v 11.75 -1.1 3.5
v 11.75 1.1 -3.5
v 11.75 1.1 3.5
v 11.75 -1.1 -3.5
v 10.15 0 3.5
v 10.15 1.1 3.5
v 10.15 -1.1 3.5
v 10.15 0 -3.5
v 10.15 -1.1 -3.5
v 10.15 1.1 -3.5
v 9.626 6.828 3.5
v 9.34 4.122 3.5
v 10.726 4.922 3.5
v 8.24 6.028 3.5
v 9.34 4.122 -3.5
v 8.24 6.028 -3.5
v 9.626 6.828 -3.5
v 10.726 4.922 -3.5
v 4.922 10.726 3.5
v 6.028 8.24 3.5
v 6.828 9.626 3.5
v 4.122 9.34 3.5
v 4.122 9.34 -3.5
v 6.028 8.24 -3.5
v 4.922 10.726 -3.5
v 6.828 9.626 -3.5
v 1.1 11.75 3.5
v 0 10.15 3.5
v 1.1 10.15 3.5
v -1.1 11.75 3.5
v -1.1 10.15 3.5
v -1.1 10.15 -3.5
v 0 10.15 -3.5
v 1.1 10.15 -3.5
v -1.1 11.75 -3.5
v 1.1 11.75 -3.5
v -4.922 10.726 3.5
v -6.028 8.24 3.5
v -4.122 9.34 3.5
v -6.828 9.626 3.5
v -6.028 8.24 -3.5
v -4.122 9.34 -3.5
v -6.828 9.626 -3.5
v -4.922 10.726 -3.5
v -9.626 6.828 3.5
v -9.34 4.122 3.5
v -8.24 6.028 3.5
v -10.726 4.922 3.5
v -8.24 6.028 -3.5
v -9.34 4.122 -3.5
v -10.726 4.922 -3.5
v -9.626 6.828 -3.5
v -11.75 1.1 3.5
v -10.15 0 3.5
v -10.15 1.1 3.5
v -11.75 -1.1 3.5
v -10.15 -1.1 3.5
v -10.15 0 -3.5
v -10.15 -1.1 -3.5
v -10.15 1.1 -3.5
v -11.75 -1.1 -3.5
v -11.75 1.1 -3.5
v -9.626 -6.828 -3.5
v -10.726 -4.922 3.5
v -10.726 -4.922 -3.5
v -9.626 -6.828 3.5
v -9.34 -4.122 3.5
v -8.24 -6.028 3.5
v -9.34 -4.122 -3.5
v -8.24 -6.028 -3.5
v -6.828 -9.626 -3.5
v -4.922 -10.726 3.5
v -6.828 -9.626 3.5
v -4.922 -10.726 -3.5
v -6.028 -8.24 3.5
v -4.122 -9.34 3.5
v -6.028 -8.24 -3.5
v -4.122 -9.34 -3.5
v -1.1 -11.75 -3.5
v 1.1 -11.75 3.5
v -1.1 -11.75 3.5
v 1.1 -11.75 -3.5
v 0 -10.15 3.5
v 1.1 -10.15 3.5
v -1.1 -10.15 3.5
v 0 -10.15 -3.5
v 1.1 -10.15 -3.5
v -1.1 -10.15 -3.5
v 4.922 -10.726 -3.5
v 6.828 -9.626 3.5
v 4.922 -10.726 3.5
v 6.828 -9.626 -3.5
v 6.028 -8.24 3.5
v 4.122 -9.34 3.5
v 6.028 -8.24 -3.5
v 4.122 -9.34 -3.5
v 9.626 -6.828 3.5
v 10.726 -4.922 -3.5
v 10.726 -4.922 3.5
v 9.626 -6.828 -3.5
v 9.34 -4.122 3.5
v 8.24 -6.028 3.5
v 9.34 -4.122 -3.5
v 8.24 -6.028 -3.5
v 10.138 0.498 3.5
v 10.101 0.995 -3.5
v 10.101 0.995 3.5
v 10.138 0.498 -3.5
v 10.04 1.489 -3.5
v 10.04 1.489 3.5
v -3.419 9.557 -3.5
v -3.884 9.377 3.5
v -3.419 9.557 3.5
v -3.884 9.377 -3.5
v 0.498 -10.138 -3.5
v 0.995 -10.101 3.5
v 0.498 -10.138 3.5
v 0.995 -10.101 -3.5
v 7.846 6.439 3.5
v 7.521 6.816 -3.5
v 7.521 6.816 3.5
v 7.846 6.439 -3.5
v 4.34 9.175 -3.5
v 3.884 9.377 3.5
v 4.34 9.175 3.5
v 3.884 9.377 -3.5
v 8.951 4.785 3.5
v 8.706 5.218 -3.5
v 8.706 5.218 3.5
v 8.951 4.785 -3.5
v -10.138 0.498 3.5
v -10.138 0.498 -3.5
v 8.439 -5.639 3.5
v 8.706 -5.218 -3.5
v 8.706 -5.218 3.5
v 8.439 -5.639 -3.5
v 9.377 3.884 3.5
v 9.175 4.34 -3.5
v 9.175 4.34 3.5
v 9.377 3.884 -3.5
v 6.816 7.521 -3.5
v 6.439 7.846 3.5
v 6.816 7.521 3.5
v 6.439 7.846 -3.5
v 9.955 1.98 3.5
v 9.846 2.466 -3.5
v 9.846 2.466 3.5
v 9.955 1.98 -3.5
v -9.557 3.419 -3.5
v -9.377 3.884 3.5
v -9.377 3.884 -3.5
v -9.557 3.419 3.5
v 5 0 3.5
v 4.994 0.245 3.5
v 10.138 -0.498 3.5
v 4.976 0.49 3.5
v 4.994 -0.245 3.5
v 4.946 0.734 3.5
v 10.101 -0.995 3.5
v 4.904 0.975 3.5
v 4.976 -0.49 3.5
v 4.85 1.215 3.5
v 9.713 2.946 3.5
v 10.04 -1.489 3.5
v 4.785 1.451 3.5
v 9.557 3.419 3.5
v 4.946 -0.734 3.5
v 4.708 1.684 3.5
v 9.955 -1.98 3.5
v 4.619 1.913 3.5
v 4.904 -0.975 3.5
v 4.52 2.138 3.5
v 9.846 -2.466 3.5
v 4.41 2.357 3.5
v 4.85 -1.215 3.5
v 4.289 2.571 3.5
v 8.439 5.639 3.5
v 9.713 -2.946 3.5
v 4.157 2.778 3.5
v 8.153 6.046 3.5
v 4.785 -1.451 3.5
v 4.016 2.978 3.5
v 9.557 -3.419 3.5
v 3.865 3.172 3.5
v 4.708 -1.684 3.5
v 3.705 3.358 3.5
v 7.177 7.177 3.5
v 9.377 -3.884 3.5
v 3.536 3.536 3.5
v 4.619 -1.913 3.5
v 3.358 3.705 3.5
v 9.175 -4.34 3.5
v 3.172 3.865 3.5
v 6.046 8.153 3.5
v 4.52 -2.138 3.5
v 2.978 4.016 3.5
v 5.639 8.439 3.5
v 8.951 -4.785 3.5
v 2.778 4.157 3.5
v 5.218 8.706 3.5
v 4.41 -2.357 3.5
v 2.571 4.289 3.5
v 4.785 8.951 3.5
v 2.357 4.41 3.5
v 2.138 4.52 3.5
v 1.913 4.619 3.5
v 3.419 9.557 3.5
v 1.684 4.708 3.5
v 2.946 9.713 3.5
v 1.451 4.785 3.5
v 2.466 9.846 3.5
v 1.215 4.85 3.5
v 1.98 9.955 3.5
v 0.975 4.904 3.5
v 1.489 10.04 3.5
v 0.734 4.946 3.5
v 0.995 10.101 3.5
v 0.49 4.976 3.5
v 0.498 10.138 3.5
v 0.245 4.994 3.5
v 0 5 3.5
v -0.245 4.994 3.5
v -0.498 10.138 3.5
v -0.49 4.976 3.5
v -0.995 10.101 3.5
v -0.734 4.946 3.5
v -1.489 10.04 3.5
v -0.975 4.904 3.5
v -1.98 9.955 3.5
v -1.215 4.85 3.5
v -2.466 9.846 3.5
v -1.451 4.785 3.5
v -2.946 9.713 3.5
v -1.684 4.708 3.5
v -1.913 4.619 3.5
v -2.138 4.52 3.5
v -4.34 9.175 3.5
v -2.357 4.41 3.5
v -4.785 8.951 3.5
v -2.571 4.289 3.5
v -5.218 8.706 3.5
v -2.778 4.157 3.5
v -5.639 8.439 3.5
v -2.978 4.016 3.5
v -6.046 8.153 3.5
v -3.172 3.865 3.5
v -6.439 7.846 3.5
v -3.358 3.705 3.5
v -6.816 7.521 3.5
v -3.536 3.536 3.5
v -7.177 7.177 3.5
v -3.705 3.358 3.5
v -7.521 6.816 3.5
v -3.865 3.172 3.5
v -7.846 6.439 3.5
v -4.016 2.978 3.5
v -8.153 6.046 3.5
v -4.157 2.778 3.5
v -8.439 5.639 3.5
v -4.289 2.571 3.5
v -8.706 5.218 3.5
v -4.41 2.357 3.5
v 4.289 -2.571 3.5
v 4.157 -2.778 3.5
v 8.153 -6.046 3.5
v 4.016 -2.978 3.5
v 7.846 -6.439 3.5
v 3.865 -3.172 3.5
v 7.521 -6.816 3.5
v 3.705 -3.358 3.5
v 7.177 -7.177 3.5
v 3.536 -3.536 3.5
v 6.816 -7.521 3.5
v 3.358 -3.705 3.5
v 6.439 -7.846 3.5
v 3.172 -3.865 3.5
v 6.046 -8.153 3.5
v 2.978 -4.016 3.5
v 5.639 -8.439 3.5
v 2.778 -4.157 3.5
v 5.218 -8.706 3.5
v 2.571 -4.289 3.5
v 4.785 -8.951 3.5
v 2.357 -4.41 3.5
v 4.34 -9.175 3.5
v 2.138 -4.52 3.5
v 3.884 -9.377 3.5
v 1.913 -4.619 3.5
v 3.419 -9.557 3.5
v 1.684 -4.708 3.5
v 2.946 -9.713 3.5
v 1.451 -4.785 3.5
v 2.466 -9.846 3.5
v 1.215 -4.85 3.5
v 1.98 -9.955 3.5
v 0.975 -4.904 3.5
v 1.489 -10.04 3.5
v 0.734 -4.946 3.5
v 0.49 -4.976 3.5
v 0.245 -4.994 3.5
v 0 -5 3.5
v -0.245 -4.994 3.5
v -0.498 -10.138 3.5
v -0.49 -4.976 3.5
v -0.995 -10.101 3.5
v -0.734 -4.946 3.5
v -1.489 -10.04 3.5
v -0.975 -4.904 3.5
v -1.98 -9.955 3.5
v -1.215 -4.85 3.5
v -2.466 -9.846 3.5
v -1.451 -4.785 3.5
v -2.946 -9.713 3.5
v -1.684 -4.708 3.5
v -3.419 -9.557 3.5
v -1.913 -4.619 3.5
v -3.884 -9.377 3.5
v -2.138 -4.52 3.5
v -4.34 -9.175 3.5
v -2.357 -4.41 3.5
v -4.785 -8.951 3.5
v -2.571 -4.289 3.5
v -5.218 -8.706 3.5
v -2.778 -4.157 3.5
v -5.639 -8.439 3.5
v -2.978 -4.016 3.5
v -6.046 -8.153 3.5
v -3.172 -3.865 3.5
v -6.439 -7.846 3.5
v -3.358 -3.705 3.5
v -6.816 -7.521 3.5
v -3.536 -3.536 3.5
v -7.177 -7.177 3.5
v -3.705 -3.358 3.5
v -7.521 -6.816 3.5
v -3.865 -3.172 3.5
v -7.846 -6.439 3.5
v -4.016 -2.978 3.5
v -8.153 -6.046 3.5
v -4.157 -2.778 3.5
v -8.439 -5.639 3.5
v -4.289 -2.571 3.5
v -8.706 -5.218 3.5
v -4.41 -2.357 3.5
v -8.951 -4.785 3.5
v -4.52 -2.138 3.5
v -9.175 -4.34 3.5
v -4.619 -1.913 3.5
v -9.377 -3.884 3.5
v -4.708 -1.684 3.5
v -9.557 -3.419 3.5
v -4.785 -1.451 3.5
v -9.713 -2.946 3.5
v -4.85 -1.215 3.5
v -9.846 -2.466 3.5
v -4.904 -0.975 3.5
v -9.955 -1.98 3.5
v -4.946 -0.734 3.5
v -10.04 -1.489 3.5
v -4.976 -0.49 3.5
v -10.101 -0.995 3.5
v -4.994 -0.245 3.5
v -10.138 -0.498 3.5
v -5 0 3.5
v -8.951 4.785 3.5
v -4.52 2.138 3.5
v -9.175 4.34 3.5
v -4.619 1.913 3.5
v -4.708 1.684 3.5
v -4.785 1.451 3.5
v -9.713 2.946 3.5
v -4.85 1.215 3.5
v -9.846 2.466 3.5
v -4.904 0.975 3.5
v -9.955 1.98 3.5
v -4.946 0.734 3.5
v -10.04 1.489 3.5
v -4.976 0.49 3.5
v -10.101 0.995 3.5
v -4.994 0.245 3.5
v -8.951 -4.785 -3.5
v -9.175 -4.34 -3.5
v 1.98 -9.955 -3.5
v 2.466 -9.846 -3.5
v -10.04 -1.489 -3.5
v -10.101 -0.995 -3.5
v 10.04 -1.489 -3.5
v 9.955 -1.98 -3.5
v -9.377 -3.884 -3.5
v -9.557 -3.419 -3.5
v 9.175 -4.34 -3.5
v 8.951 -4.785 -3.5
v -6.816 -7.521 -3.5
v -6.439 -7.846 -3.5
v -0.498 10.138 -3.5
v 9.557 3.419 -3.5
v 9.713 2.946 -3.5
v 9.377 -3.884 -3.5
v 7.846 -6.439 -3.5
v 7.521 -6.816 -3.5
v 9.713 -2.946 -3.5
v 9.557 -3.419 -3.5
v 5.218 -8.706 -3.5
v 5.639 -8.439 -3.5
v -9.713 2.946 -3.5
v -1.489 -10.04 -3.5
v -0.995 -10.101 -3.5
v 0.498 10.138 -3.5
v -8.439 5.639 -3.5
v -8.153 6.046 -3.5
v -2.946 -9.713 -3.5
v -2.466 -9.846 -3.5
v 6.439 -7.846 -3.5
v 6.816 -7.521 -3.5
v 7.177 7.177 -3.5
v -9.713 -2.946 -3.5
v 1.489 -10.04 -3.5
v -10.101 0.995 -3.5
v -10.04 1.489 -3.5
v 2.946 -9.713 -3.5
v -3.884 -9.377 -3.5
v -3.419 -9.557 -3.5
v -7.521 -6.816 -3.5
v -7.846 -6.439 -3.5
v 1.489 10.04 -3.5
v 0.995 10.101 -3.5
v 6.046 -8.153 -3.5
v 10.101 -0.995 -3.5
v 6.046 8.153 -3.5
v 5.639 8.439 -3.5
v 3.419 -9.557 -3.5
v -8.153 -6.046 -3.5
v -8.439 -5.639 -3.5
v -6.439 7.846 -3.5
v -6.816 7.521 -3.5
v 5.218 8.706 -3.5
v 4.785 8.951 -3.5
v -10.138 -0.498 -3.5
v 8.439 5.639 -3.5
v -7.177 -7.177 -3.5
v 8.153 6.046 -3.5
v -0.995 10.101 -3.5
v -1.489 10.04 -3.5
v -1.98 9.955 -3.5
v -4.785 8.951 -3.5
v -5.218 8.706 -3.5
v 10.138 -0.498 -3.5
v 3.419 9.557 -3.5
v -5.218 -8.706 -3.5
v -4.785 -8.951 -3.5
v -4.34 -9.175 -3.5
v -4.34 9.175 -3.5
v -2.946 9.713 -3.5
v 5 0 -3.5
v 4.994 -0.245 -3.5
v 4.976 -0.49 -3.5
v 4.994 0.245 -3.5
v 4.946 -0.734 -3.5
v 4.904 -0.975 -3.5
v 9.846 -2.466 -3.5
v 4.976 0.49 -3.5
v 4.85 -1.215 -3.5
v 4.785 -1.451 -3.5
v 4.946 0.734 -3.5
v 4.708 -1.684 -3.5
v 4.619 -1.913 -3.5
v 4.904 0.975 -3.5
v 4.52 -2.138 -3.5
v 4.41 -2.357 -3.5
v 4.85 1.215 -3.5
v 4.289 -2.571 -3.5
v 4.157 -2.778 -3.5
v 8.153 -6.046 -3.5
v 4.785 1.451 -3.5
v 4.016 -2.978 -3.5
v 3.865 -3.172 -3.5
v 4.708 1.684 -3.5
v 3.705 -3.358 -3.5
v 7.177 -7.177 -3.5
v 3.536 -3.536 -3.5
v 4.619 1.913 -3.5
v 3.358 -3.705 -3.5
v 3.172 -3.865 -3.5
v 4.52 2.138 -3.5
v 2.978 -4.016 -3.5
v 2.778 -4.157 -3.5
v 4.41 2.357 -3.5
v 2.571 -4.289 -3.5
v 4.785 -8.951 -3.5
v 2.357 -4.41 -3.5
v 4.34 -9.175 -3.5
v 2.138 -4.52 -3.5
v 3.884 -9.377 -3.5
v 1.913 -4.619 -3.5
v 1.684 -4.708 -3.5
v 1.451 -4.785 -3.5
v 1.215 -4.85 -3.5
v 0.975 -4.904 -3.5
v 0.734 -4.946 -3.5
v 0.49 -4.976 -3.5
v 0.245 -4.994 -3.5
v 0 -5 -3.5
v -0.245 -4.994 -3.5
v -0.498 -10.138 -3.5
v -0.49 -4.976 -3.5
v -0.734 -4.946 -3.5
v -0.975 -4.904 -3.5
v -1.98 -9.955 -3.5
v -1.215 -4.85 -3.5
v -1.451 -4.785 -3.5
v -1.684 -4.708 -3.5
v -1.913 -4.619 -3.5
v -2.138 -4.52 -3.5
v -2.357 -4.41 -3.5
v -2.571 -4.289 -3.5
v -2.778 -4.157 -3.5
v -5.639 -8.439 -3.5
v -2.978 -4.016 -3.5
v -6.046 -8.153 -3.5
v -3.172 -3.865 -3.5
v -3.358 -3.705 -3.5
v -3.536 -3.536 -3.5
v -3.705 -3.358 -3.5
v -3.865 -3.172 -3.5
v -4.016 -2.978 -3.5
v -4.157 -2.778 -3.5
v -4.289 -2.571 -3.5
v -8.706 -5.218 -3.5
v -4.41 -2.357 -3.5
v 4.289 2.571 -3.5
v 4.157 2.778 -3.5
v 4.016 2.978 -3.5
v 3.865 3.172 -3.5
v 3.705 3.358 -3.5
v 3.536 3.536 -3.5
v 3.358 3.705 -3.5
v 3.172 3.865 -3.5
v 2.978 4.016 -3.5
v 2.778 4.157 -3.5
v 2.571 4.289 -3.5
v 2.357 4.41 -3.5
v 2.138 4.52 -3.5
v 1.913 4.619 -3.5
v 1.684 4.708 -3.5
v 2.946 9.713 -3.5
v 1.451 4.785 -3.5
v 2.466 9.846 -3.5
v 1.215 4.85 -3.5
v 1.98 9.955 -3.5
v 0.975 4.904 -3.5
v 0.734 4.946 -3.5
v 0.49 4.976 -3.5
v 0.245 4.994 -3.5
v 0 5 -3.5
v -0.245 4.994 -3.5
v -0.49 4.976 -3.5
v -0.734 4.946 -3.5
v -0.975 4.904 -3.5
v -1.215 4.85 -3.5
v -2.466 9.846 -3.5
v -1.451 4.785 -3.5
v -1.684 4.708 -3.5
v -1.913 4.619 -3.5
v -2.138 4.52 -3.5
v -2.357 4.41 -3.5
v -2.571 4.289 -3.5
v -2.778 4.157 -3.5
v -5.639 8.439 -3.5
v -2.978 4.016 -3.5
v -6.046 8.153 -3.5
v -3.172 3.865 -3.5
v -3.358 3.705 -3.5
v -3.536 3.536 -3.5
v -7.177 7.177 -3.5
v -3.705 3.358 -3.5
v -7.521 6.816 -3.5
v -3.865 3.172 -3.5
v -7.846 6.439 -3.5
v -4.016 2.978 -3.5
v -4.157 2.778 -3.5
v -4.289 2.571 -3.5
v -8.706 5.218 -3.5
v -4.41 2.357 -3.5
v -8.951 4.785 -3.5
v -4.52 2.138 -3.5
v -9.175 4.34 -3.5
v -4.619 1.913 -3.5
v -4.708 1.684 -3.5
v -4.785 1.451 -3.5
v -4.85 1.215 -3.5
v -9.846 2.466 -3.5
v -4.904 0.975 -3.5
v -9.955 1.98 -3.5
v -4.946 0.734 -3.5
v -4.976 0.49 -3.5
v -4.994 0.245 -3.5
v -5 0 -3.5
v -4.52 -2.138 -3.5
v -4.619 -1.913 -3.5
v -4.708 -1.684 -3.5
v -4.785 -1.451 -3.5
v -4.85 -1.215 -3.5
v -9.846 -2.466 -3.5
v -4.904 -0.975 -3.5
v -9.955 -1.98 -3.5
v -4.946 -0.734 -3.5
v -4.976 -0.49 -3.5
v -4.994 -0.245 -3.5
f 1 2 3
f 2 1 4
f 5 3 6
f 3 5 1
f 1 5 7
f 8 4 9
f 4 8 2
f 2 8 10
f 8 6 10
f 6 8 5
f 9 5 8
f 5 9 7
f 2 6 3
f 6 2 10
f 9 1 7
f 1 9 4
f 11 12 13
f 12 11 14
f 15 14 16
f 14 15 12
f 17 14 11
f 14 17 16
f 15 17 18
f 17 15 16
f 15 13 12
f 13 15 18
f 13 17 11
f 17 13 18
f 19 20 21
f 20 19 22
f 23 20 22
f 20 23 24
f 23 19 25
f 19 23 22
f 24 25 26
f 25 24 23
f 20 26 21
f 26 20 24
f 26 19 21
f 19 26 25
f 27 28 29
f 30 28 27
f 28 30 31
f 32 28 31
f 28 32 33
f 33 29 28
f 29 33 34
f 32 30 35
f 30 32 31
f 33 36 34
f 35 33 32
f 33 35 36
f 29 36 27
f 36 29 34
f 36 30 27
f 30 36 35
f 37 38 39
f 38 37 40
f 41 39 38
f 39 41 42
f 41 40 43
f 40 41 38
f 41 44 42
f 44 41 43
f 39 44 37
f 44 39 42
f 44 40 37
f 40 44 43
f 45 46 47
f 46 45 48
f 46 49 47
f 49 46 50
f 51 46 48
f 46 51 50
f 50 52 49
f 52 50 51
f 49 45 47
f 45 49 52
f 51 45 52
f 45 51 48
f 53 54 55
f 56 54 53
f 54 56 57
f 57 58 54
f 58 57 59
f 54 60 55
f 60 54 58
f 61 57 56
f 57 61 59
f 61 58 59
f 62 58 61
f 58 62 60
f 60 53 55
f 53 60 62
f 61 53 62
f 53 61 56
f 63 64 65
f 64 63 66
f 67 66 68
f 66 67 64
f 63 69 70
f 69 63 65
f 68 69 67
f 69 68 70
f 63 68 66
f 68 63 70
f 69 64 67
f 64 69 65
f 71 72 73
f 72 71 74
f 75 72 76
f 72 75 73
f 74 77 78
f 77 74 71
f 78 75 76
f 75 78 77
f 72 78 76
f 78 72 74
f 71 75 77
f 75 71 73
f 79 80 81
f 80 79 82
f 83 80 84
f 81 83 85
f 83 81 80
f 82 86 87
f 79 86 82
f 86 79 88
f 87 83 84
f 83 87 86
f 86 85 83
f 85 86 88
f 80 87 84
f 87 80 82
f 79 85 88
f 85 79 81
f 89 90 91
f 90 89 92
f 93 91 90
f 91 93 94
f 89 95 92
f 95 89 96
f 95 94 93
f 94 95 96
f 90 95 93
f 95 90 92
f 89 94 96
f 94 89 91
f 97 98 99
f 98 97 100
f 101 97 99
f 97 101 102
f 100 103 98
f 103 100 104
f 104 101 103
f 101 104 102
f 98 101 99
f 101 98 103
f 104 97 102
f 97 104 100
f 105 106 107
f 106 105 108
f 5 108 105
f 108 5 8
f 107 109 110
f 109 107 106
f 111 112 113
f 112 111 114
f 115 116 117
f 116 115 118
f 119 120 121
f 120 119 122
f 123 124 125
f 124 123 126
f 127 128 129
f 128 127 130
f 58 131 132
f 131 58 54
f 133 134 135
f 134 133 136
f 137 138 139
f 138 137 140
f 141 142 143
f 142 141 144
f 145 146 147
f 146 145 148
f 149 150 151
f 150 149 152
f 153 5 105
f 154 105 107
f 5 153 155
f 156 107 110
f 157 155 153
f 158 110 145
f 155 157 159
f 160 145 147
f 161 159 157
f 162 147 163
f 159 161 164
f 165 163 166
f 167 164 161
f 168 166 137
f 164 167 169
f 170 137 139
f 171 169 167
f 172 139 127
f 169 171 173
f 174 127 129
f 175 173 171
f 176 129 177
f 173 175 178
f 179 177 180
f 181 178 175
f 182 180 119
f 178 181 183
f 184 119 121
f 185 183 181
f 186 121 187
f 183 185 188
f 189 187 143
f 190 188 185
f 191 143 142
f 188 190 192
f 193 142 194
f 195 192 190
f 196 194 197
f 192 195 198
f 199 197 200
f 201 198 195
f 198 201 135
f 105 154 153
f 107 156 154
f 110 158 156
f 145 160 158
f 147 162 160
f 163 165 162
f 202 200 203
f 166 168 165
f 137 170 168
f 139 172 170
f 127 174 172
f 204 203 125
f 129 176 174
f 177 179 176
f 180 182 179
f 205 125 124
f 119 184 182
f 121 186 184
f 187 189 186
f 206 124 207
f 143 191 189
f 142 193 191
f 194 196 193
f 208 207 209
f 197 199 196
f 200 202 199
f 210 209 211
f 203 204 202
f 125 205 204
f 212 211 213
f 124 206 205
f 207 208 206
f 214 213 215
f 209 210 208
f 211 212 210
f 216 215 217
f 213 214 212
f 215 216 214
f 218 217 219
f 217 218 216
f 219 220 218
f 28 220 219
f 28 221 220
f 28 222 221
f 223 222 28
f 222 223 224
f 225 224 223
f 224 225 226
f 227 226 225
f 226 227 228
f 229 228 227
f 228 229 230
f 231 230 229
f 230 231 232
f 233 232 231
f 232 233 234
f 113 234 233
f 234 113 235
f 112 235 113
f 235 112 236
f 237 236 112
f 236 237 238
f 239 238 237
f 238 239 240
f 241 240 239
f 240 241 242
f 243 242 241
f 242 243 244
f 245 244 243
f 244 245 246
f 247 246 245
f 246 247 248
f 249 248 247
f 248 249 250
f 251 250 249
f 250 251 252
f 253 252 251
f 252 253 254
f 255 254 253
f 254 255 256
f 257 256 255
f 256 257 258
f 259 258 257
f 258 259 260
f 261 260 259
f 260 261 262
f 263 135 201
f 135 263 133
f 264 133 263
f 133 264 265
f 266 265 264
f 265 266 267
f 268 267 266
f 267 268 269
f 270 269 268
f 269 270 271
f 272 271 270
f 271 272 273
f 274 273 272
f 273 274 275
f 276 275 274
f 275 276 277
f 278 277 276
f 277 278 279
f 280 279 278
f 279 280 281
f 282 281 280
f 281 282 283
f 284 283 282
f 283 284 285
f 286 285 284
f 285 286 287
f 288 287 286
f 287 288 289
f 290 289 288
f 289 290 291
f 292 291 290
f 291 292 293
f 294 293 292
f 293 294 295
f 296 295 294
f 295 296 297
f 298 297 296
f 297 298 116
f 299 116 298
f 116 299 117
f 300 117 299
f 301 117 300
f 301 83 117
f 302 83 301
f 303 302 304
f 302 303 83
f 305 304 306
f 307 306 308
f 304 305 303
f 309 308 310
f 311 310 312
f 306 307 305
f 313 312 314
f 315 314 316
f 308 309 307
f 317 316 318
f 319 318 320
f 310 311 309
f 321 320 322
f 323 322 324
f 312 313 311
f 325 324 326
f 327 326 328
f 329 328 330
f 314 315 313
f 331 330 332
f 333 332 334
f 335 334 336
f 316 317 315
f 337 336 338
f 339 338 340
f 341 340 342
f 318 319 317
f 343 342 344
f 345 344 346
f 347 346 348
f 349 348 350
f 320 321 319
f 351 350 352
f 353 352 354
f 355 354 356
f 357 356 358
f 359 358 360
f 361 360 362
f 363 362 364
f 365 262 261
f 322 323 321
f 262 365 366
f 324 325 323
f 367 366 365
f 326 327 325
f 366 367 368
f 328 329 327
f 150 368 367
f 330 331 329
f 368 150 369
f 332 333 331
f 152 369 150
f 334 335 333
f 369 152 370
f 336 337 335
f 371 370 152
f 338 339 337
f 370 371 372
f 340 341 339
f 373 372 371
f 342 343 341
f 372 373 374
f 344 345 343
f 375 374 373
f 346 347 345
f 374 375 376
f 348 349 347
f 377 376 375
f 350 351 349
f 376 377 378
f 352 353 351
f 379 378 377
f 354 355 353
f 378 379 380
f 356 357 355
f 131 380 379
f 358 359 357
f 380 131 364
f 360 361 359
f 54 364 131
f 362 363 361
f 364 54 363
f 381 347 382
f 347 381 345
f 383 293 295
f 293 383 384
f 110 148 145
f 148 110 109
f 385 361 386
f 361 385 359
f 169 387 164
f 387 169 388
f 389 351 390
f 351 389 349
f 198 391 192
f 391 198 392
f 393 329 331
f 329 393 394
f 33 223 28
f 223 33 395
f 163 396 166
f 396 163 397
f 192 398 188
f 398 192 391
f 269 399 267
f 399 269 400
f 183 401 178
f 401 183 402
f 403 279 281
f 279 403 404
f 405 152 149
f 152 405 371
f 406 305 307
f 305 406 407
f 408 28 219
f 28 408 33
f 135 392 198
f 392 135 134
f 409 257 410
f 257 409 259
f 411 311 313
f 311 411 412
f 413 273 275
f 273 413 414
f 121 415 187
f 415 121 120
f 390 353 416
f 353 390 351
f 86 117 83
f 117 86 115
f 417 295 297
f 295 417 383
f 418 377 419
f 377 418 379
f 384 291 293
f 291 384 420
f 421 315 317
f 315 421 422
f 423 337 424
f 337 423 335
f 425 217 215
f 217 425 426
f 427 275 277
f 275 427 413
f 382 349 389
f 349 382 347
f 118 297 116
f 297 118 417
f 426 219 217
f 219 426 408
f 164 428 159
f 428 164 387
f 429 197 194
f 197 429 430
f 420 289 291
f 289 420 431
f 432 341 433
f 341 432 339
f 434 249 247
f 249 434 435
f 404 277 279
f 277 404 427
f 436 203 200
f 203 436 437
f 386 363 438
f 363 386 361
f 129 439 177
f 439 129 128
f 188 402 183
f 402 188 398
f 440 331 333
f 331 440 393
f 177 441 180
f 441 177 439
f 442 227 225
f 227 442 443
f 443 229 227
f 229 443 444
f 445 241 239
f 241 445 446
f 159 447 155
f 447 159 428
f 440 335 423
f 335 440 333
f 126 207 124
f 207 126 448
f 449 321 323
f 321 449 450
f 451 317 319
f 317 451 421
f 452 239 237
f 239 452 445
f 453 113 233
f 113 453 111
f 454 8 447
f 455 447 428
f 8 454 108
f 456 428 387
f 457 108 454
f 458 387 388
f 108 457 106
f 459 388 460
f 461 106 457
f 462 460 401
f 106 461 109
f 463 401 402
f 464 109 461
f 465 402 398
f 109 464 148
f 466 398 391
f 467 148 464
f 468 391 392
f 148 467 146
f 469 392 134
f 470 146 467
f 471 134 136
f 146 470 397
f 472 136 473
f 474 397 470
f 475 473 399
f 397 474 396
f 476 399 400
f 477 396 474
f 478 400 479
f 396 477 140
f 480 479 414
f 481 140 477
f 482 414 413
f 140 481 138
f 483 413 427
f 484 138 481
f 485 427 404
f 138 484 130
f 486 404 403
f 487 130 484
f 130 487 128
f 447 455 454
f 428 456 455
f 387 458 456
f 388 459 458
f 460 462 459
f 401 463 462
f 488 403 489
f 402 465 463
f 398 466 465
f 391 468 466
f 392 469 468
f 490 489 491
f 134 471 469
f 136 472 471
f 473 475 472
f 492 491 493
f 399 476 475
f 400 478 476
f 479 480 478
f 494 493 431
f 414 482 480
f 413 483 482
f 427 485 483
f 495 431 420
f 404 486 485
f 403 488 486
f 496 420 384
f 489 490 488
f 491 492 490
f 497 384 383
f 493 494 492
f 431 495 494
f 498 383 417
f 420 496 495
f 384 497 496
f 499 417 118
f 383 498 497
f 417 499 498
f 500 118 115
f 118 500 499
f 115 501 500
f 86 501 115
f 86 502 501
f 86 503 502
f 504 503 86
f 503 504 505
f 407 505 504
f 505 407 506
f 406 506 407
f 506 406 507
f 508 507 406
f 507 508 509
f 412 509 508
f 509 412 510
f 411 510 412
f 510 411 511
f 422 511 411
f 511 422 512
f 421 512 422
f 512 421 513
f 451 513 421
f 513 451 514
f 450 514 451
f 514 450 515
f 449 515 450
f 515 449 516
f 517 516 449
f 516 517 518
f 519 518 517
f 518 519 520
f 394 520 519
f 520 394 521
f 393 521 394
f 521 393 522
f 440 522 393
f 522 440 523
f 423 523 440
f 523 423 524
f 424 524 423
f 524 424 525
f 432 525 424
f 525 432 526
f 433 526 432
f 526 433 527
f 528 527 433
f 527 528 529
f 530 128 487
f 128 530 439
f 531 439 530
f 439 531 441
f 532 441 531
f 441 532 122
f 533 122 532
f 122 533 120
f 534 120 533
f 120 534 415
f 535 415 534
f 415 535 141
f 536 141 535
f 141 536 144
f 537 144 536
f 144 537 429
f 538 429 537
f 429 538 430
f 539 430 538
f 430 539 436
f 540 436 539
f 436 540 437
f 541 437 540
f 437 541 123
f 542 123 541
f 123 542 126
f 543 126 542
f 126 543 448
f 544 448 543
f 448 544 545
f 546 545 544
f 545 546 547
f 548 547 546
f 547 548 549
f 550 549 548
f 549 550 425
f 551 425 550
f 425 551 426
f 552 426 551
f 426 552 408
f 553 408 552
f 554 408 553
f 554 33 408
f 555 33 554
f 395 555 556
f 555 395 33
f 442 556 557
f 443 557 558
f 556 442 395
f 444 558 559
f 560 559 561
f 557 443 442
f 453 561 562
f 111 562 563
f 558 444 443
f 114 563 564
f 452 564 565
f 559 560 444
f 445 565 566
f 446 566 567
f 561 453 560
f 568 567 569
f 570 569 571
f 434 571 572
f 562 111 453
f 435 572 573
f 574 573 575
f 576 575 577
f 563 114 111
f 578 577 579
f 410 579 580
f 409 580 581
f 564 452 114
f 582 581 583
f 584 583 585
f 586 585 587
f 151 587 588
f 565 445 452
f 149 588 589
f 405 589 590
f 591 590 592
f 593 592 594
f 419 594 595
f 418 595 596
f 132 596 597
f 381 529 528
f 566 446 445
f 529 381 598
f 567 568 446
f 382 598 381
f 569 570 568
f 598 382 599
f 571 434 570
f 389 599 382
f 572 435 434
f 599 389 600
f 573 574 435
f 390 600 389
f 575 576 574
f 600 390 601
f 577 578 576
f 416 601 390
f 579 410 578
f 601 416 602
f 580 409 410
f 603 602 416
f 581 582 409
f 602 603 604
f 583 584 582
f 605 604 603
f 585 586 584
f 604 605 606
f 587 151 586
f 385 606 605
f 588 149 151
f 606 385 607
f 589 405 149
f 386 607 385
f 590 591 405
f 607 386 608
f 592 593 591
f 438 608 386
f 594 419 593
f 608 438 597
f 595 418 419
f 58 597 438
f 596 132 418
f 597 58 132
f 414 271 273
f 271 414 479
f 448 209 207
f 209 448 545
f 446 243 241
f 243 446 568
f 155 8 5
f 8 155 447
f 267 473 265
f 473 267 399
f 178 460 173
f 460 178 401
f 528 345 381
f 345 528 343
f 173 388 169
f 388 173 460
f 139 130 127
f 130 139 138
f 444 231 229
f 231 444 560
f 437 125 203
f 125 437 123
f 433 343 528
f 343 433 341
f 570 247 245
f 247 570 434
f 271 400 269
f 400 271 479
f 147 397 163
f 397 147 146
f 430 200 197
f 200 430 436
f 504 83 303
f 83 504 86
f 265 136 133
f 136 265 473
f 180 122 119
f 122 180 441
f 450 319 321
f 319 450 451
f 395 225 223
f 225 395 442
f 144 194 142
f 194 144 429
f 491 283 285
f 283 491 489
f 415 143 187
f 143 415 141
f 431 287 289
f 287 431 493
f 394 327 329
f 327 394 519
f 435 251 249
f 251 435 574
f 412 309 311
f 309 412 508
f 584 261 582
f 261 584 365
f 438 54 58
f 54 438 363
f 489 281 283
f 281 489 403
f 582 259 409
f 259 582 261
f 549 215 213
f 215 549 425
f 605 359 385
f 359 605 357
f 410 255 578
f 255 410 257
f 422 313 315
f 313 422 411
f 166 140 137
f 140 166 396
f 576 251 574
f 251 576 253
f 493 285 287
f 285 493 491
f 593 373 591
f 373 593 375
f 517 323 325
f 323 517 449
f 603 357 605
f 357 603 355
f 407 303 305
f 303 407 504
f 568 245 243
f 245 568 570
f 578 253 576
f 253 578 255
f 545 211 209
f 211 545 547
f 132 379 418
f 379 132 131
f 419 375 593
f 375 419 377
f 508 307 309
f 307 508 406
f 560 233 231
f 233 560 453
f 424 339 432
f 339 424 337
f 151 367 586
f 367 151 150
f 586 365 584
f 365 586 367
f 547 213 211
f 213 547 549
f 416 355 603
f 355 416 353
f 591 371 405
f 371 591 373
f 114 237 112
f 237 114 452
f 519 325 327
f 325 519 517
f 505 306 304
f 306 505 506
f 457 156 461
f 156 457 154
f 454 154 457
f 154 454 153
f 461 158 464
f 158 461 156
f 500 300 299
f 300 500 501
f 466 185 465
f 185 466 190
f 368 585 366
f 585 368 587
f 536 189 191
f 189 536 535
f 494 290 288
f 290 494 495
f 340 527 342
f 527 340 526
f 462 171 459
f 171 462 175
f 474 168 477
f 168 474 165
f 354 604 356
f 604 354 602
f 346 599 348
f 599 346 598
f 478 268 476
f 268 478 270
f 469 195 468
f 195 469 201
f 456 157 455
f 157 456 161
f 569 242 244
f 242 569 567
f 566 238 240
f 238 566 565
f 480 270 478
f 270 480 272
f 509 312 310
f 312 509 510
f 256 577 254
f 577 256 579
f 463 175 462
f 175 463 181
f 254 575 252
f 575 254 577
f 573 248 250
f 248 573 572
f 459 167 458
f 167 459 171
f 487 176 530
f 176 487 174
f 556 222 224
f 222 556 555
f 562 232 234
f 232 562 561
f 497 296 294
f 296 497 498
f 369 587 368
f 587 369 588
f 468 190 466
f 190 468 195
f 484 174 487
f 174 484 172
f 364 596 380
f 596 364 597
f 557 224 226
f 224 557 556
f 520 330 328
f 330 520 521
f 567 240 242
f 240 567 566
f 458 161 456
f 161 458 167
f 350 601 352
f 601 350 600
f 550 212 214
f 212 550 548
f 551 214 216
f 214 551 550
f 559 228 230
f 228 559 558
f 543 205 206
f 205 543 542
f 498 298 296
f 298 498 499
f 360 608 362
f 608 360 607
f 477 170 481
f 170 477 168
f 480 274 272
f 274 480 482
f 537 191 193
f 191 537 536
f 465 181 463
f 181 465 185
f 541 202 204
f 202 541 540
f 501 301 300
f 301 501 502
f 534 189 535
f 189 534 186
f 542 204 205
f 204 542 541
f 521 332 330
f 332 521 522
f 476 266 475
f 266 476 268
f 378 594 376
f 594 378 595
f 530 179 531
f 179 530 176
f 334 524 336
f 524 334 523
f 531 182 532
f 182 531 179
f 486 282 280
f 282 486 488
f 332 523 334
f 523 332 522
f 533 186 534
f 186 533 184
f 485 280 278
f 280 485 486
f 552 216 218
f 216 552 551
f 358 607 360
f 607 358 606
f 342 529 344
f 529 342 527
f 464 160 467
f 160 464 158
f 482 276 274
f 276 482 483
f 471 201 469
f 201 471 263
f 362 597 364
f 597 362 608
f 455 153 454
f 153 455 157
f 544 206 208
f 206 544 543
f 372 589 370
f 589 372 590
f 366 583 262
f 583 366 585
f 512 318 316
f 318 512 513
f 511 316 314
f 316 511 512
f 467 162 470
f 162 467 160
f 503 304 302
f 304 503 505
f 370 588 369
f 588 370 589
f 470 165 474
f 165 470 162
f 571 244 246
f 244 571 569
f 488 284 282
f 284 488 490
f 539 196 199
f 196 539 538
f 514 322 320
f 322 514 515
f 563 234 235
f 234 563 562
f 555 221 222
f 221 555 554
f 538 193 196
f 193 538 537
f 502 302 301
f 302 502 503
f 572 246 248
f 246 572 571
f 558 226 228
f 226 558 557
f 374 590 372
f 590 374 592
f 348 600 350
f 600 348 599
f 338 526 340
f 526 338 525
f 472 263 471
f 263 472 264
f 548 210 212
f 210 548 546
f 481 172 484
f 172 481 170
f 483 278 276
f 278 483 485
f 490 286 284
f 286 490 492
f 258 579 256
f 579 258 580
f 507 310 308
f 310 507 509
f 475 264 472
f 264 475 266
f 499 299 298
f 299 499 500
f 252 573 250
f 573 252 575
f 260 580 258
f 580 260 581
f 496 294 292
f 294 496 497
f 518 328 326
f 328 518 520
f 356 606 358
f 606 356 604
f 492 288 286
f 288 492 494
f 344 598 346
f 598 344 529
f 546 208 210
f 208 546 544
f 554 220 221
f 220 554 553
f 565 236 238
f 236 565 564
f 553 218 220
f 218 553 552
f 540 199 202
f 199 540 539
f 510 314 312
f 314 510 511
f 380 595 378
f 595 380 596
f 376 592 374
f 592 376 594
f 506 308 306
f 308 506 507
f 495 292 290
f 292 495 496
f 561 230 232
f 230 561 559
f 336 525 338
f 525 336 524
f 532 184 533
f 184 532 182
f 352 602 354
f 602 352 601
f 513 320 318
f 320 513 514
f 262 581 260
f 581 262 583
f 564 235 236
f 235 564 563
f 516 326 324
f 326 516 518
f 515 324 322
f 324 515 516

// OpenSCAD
$fn=128;

outer_d = 23.5;
thickness = 7.0;

bore_d = 10.0;

tooth_count = 12;
tooth_radial = 1.6;
tooth_tangential = 2.2;

module tooth(r_base, t, radial, tangential){
    translate([r_base + radial/2, 0, 0])
        cube([radial, tangential, t], center=true);
}

module ring_with_teeth(od, t, bore, n, radial, tangential){
    r_outer = od/2;
    r_base = r_outer - radial;
    difference(){
        union(){
            cylinder(d=2*r_base, h=t, center=true);
            for(i=[0:n-1]){
                rotate([0,0, i*360/n])
                    tooth(r_base, t, radial, tangential);
            }
        }
        cylinder(d=bore, h=t+0.6, center=true);
    }
}

ring_with_teeth(outer_d, thickness, bore_d, tooth_count, tooth_radial, tooth_tangential);
